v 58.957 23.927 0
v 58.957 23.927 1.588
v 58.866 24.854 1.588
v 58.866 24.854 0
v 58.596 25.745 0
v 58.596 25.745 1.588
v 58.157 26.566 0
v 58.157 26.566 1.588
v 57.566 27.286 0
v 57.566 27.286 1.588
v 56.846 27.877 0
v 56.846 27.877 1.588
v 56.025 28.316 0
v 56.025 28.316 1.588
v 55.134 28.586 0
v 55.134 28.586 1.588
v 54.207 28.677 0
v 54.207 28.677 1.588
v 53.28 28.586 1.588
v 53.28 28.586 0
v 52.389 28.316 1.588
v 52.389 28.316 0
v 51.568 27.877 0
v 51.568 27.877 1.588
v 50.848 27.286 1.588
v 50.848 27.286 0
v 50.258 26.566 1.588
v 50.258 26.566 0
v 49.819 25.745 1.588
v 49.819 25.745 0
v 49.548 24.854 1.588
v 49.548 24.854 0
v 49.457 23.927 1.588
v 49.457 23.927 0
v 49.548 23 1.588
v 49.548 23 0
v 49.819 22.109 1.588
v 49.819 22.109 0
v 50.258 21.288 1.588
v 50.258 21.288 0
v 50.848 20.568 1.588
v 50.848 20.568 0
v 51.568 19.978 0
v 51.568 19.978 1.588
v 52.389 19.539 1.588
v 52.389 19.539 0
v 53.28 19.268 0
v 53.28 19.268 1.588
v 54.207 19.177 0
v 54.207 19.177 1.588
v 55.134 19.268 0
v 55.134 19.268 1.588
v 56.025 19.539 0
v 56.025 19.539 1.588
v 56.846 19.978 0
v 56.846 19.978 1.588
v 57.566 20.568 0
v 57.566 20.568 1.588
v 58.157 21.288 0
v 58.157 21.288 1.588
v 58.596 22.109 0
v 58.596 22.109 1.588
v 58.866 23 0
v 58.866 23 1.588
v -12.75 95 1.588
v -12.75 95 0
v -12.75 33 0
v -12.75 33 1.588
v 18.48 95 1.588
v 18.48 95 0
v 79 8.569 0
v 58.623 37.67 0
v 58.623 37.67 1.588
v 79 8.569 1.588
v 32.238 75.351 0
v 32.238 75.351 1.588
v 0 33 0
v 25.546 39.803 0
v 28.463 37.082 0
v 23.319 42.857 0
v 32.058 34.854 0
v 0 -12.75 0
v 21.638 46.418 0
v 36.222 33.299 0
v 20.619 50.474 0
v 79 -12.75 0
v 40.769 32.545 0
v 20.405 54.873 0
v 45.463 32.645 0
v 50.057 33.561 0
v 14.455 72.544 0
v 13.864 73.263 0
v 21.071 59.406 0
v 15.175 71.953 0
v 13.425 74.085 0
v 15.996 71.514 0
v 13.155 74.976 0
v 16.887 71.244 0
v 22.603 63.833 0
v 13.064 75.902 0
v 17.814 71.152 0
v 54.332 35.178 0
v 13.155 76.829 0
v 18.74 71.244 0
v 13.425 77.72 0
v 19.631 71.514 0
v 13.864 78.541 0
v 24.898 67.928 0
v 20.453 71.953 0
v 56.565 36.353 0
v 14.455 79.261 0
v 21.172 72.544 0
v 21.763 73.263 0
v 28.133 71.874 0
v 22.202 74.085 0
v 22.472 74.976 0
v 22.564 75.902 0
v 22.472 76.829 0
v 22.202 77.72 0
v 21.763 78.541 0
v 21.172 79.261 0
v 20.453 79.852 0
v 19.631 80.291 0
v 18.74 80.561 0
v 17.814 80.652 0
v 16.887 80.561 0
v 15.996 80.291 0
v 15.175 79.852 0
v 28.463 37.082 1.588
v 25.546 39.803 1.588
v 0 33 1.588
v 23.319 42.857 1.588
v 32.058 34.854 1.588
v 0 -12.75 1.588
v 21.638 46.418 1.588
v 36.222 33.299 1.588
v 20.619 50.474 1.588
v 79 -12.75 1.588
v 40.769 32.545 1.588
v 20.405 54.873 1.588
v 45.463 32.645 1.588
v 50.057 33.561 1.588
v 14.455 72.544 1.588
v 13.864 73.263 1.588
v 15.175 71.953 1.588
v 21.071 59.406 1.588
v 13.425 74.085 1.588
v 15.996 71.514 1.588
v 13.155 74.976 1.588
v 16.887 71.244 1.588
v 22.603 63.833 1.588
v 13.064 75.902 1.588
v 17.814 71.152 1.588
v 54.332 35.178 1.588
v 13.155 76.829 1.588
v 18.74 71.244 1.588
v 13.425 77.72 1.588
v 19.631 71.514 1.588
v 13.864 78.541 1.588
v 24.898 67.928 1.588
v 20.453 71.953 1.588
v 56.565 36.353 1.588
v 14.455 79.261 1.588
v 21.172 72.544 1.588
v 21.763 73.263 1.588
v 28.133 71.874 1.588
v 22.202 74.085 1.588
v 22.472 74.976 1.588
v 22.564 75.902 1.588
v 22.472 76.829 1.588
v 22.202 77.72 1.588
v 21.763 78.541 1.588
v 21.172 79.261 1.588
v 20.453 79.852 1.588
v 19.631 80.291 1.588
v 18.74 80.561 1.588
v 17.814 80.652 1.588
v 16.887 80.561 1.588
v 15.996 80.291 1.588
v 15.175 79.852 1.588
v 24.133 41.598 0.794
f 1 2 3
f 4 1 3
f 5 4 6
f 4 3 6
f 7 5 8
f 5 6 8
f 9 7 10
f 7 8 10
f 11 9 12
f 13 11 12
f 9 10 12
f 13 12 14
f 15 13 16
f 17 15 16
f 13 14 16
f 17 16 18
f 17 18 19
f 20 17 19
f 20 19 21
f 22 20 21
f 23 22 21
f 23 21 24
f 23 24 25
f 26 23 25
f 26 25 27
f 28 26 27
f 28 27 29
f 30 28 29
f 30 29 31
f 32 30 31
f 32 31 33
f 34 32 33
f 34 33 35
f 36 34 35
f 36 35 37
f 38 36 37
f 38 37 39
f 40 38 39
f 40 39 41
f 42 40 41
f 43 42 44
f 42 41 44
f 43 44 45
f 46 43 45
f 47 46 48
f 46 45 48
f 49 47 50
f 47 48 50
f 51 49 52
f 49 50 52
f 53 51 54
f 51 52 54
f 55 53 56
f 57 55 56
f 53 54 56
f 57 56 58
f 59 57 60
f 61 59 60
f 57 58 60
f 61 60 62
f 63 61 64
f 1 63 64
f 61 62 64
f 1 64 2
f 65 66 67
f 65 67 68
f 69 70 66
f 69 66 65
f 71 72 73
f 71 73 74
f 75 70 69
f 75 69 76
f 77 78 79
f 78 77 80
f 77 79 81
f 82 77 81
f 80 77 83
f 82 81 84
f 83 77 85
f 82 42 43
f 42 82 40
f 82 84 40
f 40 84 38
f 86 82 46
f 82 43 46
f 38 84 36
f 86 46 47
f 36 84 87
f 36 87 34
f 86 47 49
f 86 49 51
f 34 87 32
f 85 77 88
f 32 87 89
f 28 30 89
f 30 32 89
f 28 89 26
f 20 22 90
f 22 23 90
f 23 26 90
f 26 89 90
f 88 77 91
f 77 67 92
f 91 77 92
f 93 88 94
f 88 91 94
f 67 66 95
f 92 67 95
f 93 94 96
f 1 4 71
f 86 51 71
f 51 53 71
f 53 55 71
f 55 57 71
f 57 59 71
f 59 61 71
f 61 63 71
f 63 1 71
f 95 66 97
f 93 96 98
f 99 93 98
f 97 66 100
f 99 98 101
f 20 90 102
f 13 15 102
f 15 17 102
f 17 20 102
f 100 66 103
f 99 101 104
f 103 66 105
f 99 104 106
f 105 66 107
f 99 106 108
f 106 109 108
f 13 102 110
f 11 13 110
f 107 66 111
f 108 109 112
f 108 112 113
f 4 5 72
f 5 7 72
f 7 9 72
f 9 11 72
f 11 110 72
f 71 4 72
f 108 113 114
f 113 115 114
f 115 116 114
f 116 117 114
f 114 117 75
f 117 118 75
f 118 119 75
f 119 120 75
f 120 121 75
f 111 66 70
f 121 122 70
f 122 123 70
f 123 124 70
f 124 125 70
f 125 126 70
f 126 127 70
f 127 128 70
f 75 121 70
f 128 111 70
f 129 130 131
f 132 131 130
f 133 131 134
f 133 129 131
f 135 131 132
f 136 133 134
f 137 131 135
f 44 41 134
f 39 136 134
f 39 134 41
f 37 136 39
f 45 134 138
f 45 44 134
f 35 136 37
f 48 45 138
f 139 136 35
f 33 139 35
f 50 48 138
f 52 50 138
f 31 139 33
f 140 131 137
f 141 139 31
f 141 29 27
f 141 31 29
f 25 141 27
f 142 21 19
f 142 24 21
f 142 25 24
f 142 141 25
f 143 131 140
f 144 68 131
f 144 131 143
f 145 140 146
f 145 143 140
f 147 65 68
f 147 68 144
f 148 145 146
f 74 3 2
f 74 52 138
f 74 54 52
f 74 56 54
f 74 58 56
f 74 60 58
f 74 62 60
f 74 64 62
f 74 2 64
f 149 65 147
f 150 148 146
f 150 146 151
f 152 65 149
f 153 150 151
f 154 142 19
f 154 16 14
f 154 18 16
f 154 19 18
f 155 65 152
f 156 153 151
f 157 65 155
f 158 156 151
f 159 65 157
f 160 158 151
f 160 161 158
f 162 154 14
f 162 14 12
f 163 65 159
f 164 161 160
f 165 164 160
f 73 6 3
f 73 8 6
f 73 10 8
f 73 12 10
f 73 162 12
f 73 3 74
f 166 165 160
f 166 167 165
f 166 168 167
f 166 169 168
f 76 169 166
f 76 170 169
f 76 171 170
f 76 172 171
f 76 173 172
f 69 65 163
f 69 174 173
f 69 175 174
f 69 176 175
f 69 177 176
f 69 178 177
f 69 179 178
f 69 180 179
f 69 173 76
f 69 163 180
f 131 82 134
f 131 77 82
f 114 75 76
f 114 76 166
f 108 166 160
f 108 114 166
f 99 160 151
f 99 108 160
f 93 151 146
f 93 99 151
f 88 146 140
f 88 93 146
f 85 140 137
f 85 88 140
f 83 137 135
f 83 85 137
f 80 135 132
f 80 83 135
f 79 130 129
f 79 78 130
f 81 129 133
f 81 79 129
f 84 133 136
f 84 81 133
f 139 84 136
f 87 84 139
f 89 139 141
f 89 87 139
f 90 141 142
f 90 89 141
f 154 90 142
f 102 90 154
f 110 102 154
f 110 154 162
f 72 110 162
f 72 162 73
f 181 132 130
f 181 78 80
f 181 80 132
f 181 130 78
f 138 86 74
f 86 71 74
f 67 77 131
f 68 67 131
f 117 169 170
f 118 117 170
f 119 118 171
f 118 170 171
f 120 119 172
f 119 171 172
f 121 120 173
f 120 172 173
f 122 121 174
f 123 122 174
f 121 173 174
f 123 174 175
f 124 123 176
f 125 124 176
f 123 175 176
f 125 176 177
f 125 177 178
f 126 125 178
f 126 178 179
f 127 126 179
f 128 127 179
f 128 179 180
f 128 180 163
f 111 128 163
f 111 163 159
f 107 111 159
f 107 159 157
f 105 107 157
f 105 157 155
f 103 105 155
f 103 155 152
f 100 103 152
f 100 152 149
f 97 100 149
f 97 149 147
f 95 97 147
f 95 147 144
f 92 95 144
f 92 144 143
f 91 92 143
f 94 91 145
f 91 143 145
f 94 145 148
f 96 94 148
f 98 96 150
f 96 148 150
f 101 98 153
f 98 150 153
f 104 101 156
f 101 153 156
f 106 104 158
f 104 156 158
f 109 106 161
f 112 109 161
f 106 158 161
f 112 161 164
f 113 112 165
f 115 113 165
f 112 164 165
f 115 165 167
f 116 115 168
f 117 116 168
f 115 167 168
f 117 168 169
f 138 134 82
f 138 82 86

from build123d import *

# Parameters (mm, degrees)
BOSS_EXTRUDE1_DEPTH = 1.5875
SKETCH2_R           = 4.75
CUT_EXTRUDE1_DEPTH  = 135.08080599
CUT_EXTRUDE2_DEPTH  = 135.08080599
SKETCH4_W           = 1.5875
SKETCH4_H           = 62
BOSS_EXTRUDE2_DEPTH = 12.75
SKETCH5_W           = 79
SKETCH5_H           = 1.5875
BOSS_EXTRUDE3_DEPTH = 12.75


with BuildPart() as part:
    # Sketch1 → Boss-Extrude1 (new body)
    with BuildSketch(Plane.XY):
        with BuildLine():
            add(Edge.make_bspline(
                [(32.238440812, 75.351315587), (10.94048766, 60.438328242), (24.132745696, 41.597831224), (37.325003732, 22.757334205), (58.622956884, 37.67032155)],
                knots=[1.570796327, 1.570796327, 1.570796327, 3.141592654, 3.141592654, 4.71238898, 4.71238898, 4.71238898], degree=2, weights=[1, 0.707106781, 1, 0.707106781, 1]))
            Line((58.622956884, 37.67032155), (85, 0))
            Line((85, 0), (0, 0))
            Line((0, 0), (0, 95))
            Line((0, 95), (12.400456604, 103.682893191))
            Line((12.400456604, 103.682893191), (32.238440812, 75.351315587))
        make_face()
    extrude(amount=BOSS_EXTRUDE1_DEPTH)

    # Sketch2 → Cut-Extrude1 (cut, through all)
    with BuildSketch(Plane.XY.offset(1.5875)):
        with Locations((17.813737895, 75.902288156)):
            Circle(SKETCH2_R)
        with Locations((54.207162782, 23.927090946)):
            Circle(SKETCH2_R)
    extrude(amount=-CUT_EXTRUDE1_DEPTH, mode=Mode.SUBTRACT)

    # Sketch3 → Cut-Extrude2 (cut, through all)
    with BuildSketch(Plane.XY.offset(1.5875)):
        Polygon((79, 8.56888804), (79, 0), (85, 0), align=None)
        Polygon((0, 95), (18.48028387, 95), (12.400456604, 103.682893191), align=None)
    extrude(amount=-CUT_EXTRUDE2_DEPTH, mode=Mode.SUBTRACT)

    # Sketch4 → Boss-Extrude2 (add)
    with BuildSketch(Plane.ZY):
        with Locations((0.79375, 64)):
            Rectangle(SKETCH4_W, SKETCH4_H)
    extrude(amount=BOSS_EXTRUDE2_DEPTH)

    # Sketch5 → Boss-Extrude3 (add)
    with BuildSketch(Plane.XZ):
        with Locations((39.5, 0.79375)):
            Rectangle(SKETCH5_W, SKETCH5_H)
    extrude(amount=BOSS_EXTRUDE3_DEPTH)


solid = part.part
